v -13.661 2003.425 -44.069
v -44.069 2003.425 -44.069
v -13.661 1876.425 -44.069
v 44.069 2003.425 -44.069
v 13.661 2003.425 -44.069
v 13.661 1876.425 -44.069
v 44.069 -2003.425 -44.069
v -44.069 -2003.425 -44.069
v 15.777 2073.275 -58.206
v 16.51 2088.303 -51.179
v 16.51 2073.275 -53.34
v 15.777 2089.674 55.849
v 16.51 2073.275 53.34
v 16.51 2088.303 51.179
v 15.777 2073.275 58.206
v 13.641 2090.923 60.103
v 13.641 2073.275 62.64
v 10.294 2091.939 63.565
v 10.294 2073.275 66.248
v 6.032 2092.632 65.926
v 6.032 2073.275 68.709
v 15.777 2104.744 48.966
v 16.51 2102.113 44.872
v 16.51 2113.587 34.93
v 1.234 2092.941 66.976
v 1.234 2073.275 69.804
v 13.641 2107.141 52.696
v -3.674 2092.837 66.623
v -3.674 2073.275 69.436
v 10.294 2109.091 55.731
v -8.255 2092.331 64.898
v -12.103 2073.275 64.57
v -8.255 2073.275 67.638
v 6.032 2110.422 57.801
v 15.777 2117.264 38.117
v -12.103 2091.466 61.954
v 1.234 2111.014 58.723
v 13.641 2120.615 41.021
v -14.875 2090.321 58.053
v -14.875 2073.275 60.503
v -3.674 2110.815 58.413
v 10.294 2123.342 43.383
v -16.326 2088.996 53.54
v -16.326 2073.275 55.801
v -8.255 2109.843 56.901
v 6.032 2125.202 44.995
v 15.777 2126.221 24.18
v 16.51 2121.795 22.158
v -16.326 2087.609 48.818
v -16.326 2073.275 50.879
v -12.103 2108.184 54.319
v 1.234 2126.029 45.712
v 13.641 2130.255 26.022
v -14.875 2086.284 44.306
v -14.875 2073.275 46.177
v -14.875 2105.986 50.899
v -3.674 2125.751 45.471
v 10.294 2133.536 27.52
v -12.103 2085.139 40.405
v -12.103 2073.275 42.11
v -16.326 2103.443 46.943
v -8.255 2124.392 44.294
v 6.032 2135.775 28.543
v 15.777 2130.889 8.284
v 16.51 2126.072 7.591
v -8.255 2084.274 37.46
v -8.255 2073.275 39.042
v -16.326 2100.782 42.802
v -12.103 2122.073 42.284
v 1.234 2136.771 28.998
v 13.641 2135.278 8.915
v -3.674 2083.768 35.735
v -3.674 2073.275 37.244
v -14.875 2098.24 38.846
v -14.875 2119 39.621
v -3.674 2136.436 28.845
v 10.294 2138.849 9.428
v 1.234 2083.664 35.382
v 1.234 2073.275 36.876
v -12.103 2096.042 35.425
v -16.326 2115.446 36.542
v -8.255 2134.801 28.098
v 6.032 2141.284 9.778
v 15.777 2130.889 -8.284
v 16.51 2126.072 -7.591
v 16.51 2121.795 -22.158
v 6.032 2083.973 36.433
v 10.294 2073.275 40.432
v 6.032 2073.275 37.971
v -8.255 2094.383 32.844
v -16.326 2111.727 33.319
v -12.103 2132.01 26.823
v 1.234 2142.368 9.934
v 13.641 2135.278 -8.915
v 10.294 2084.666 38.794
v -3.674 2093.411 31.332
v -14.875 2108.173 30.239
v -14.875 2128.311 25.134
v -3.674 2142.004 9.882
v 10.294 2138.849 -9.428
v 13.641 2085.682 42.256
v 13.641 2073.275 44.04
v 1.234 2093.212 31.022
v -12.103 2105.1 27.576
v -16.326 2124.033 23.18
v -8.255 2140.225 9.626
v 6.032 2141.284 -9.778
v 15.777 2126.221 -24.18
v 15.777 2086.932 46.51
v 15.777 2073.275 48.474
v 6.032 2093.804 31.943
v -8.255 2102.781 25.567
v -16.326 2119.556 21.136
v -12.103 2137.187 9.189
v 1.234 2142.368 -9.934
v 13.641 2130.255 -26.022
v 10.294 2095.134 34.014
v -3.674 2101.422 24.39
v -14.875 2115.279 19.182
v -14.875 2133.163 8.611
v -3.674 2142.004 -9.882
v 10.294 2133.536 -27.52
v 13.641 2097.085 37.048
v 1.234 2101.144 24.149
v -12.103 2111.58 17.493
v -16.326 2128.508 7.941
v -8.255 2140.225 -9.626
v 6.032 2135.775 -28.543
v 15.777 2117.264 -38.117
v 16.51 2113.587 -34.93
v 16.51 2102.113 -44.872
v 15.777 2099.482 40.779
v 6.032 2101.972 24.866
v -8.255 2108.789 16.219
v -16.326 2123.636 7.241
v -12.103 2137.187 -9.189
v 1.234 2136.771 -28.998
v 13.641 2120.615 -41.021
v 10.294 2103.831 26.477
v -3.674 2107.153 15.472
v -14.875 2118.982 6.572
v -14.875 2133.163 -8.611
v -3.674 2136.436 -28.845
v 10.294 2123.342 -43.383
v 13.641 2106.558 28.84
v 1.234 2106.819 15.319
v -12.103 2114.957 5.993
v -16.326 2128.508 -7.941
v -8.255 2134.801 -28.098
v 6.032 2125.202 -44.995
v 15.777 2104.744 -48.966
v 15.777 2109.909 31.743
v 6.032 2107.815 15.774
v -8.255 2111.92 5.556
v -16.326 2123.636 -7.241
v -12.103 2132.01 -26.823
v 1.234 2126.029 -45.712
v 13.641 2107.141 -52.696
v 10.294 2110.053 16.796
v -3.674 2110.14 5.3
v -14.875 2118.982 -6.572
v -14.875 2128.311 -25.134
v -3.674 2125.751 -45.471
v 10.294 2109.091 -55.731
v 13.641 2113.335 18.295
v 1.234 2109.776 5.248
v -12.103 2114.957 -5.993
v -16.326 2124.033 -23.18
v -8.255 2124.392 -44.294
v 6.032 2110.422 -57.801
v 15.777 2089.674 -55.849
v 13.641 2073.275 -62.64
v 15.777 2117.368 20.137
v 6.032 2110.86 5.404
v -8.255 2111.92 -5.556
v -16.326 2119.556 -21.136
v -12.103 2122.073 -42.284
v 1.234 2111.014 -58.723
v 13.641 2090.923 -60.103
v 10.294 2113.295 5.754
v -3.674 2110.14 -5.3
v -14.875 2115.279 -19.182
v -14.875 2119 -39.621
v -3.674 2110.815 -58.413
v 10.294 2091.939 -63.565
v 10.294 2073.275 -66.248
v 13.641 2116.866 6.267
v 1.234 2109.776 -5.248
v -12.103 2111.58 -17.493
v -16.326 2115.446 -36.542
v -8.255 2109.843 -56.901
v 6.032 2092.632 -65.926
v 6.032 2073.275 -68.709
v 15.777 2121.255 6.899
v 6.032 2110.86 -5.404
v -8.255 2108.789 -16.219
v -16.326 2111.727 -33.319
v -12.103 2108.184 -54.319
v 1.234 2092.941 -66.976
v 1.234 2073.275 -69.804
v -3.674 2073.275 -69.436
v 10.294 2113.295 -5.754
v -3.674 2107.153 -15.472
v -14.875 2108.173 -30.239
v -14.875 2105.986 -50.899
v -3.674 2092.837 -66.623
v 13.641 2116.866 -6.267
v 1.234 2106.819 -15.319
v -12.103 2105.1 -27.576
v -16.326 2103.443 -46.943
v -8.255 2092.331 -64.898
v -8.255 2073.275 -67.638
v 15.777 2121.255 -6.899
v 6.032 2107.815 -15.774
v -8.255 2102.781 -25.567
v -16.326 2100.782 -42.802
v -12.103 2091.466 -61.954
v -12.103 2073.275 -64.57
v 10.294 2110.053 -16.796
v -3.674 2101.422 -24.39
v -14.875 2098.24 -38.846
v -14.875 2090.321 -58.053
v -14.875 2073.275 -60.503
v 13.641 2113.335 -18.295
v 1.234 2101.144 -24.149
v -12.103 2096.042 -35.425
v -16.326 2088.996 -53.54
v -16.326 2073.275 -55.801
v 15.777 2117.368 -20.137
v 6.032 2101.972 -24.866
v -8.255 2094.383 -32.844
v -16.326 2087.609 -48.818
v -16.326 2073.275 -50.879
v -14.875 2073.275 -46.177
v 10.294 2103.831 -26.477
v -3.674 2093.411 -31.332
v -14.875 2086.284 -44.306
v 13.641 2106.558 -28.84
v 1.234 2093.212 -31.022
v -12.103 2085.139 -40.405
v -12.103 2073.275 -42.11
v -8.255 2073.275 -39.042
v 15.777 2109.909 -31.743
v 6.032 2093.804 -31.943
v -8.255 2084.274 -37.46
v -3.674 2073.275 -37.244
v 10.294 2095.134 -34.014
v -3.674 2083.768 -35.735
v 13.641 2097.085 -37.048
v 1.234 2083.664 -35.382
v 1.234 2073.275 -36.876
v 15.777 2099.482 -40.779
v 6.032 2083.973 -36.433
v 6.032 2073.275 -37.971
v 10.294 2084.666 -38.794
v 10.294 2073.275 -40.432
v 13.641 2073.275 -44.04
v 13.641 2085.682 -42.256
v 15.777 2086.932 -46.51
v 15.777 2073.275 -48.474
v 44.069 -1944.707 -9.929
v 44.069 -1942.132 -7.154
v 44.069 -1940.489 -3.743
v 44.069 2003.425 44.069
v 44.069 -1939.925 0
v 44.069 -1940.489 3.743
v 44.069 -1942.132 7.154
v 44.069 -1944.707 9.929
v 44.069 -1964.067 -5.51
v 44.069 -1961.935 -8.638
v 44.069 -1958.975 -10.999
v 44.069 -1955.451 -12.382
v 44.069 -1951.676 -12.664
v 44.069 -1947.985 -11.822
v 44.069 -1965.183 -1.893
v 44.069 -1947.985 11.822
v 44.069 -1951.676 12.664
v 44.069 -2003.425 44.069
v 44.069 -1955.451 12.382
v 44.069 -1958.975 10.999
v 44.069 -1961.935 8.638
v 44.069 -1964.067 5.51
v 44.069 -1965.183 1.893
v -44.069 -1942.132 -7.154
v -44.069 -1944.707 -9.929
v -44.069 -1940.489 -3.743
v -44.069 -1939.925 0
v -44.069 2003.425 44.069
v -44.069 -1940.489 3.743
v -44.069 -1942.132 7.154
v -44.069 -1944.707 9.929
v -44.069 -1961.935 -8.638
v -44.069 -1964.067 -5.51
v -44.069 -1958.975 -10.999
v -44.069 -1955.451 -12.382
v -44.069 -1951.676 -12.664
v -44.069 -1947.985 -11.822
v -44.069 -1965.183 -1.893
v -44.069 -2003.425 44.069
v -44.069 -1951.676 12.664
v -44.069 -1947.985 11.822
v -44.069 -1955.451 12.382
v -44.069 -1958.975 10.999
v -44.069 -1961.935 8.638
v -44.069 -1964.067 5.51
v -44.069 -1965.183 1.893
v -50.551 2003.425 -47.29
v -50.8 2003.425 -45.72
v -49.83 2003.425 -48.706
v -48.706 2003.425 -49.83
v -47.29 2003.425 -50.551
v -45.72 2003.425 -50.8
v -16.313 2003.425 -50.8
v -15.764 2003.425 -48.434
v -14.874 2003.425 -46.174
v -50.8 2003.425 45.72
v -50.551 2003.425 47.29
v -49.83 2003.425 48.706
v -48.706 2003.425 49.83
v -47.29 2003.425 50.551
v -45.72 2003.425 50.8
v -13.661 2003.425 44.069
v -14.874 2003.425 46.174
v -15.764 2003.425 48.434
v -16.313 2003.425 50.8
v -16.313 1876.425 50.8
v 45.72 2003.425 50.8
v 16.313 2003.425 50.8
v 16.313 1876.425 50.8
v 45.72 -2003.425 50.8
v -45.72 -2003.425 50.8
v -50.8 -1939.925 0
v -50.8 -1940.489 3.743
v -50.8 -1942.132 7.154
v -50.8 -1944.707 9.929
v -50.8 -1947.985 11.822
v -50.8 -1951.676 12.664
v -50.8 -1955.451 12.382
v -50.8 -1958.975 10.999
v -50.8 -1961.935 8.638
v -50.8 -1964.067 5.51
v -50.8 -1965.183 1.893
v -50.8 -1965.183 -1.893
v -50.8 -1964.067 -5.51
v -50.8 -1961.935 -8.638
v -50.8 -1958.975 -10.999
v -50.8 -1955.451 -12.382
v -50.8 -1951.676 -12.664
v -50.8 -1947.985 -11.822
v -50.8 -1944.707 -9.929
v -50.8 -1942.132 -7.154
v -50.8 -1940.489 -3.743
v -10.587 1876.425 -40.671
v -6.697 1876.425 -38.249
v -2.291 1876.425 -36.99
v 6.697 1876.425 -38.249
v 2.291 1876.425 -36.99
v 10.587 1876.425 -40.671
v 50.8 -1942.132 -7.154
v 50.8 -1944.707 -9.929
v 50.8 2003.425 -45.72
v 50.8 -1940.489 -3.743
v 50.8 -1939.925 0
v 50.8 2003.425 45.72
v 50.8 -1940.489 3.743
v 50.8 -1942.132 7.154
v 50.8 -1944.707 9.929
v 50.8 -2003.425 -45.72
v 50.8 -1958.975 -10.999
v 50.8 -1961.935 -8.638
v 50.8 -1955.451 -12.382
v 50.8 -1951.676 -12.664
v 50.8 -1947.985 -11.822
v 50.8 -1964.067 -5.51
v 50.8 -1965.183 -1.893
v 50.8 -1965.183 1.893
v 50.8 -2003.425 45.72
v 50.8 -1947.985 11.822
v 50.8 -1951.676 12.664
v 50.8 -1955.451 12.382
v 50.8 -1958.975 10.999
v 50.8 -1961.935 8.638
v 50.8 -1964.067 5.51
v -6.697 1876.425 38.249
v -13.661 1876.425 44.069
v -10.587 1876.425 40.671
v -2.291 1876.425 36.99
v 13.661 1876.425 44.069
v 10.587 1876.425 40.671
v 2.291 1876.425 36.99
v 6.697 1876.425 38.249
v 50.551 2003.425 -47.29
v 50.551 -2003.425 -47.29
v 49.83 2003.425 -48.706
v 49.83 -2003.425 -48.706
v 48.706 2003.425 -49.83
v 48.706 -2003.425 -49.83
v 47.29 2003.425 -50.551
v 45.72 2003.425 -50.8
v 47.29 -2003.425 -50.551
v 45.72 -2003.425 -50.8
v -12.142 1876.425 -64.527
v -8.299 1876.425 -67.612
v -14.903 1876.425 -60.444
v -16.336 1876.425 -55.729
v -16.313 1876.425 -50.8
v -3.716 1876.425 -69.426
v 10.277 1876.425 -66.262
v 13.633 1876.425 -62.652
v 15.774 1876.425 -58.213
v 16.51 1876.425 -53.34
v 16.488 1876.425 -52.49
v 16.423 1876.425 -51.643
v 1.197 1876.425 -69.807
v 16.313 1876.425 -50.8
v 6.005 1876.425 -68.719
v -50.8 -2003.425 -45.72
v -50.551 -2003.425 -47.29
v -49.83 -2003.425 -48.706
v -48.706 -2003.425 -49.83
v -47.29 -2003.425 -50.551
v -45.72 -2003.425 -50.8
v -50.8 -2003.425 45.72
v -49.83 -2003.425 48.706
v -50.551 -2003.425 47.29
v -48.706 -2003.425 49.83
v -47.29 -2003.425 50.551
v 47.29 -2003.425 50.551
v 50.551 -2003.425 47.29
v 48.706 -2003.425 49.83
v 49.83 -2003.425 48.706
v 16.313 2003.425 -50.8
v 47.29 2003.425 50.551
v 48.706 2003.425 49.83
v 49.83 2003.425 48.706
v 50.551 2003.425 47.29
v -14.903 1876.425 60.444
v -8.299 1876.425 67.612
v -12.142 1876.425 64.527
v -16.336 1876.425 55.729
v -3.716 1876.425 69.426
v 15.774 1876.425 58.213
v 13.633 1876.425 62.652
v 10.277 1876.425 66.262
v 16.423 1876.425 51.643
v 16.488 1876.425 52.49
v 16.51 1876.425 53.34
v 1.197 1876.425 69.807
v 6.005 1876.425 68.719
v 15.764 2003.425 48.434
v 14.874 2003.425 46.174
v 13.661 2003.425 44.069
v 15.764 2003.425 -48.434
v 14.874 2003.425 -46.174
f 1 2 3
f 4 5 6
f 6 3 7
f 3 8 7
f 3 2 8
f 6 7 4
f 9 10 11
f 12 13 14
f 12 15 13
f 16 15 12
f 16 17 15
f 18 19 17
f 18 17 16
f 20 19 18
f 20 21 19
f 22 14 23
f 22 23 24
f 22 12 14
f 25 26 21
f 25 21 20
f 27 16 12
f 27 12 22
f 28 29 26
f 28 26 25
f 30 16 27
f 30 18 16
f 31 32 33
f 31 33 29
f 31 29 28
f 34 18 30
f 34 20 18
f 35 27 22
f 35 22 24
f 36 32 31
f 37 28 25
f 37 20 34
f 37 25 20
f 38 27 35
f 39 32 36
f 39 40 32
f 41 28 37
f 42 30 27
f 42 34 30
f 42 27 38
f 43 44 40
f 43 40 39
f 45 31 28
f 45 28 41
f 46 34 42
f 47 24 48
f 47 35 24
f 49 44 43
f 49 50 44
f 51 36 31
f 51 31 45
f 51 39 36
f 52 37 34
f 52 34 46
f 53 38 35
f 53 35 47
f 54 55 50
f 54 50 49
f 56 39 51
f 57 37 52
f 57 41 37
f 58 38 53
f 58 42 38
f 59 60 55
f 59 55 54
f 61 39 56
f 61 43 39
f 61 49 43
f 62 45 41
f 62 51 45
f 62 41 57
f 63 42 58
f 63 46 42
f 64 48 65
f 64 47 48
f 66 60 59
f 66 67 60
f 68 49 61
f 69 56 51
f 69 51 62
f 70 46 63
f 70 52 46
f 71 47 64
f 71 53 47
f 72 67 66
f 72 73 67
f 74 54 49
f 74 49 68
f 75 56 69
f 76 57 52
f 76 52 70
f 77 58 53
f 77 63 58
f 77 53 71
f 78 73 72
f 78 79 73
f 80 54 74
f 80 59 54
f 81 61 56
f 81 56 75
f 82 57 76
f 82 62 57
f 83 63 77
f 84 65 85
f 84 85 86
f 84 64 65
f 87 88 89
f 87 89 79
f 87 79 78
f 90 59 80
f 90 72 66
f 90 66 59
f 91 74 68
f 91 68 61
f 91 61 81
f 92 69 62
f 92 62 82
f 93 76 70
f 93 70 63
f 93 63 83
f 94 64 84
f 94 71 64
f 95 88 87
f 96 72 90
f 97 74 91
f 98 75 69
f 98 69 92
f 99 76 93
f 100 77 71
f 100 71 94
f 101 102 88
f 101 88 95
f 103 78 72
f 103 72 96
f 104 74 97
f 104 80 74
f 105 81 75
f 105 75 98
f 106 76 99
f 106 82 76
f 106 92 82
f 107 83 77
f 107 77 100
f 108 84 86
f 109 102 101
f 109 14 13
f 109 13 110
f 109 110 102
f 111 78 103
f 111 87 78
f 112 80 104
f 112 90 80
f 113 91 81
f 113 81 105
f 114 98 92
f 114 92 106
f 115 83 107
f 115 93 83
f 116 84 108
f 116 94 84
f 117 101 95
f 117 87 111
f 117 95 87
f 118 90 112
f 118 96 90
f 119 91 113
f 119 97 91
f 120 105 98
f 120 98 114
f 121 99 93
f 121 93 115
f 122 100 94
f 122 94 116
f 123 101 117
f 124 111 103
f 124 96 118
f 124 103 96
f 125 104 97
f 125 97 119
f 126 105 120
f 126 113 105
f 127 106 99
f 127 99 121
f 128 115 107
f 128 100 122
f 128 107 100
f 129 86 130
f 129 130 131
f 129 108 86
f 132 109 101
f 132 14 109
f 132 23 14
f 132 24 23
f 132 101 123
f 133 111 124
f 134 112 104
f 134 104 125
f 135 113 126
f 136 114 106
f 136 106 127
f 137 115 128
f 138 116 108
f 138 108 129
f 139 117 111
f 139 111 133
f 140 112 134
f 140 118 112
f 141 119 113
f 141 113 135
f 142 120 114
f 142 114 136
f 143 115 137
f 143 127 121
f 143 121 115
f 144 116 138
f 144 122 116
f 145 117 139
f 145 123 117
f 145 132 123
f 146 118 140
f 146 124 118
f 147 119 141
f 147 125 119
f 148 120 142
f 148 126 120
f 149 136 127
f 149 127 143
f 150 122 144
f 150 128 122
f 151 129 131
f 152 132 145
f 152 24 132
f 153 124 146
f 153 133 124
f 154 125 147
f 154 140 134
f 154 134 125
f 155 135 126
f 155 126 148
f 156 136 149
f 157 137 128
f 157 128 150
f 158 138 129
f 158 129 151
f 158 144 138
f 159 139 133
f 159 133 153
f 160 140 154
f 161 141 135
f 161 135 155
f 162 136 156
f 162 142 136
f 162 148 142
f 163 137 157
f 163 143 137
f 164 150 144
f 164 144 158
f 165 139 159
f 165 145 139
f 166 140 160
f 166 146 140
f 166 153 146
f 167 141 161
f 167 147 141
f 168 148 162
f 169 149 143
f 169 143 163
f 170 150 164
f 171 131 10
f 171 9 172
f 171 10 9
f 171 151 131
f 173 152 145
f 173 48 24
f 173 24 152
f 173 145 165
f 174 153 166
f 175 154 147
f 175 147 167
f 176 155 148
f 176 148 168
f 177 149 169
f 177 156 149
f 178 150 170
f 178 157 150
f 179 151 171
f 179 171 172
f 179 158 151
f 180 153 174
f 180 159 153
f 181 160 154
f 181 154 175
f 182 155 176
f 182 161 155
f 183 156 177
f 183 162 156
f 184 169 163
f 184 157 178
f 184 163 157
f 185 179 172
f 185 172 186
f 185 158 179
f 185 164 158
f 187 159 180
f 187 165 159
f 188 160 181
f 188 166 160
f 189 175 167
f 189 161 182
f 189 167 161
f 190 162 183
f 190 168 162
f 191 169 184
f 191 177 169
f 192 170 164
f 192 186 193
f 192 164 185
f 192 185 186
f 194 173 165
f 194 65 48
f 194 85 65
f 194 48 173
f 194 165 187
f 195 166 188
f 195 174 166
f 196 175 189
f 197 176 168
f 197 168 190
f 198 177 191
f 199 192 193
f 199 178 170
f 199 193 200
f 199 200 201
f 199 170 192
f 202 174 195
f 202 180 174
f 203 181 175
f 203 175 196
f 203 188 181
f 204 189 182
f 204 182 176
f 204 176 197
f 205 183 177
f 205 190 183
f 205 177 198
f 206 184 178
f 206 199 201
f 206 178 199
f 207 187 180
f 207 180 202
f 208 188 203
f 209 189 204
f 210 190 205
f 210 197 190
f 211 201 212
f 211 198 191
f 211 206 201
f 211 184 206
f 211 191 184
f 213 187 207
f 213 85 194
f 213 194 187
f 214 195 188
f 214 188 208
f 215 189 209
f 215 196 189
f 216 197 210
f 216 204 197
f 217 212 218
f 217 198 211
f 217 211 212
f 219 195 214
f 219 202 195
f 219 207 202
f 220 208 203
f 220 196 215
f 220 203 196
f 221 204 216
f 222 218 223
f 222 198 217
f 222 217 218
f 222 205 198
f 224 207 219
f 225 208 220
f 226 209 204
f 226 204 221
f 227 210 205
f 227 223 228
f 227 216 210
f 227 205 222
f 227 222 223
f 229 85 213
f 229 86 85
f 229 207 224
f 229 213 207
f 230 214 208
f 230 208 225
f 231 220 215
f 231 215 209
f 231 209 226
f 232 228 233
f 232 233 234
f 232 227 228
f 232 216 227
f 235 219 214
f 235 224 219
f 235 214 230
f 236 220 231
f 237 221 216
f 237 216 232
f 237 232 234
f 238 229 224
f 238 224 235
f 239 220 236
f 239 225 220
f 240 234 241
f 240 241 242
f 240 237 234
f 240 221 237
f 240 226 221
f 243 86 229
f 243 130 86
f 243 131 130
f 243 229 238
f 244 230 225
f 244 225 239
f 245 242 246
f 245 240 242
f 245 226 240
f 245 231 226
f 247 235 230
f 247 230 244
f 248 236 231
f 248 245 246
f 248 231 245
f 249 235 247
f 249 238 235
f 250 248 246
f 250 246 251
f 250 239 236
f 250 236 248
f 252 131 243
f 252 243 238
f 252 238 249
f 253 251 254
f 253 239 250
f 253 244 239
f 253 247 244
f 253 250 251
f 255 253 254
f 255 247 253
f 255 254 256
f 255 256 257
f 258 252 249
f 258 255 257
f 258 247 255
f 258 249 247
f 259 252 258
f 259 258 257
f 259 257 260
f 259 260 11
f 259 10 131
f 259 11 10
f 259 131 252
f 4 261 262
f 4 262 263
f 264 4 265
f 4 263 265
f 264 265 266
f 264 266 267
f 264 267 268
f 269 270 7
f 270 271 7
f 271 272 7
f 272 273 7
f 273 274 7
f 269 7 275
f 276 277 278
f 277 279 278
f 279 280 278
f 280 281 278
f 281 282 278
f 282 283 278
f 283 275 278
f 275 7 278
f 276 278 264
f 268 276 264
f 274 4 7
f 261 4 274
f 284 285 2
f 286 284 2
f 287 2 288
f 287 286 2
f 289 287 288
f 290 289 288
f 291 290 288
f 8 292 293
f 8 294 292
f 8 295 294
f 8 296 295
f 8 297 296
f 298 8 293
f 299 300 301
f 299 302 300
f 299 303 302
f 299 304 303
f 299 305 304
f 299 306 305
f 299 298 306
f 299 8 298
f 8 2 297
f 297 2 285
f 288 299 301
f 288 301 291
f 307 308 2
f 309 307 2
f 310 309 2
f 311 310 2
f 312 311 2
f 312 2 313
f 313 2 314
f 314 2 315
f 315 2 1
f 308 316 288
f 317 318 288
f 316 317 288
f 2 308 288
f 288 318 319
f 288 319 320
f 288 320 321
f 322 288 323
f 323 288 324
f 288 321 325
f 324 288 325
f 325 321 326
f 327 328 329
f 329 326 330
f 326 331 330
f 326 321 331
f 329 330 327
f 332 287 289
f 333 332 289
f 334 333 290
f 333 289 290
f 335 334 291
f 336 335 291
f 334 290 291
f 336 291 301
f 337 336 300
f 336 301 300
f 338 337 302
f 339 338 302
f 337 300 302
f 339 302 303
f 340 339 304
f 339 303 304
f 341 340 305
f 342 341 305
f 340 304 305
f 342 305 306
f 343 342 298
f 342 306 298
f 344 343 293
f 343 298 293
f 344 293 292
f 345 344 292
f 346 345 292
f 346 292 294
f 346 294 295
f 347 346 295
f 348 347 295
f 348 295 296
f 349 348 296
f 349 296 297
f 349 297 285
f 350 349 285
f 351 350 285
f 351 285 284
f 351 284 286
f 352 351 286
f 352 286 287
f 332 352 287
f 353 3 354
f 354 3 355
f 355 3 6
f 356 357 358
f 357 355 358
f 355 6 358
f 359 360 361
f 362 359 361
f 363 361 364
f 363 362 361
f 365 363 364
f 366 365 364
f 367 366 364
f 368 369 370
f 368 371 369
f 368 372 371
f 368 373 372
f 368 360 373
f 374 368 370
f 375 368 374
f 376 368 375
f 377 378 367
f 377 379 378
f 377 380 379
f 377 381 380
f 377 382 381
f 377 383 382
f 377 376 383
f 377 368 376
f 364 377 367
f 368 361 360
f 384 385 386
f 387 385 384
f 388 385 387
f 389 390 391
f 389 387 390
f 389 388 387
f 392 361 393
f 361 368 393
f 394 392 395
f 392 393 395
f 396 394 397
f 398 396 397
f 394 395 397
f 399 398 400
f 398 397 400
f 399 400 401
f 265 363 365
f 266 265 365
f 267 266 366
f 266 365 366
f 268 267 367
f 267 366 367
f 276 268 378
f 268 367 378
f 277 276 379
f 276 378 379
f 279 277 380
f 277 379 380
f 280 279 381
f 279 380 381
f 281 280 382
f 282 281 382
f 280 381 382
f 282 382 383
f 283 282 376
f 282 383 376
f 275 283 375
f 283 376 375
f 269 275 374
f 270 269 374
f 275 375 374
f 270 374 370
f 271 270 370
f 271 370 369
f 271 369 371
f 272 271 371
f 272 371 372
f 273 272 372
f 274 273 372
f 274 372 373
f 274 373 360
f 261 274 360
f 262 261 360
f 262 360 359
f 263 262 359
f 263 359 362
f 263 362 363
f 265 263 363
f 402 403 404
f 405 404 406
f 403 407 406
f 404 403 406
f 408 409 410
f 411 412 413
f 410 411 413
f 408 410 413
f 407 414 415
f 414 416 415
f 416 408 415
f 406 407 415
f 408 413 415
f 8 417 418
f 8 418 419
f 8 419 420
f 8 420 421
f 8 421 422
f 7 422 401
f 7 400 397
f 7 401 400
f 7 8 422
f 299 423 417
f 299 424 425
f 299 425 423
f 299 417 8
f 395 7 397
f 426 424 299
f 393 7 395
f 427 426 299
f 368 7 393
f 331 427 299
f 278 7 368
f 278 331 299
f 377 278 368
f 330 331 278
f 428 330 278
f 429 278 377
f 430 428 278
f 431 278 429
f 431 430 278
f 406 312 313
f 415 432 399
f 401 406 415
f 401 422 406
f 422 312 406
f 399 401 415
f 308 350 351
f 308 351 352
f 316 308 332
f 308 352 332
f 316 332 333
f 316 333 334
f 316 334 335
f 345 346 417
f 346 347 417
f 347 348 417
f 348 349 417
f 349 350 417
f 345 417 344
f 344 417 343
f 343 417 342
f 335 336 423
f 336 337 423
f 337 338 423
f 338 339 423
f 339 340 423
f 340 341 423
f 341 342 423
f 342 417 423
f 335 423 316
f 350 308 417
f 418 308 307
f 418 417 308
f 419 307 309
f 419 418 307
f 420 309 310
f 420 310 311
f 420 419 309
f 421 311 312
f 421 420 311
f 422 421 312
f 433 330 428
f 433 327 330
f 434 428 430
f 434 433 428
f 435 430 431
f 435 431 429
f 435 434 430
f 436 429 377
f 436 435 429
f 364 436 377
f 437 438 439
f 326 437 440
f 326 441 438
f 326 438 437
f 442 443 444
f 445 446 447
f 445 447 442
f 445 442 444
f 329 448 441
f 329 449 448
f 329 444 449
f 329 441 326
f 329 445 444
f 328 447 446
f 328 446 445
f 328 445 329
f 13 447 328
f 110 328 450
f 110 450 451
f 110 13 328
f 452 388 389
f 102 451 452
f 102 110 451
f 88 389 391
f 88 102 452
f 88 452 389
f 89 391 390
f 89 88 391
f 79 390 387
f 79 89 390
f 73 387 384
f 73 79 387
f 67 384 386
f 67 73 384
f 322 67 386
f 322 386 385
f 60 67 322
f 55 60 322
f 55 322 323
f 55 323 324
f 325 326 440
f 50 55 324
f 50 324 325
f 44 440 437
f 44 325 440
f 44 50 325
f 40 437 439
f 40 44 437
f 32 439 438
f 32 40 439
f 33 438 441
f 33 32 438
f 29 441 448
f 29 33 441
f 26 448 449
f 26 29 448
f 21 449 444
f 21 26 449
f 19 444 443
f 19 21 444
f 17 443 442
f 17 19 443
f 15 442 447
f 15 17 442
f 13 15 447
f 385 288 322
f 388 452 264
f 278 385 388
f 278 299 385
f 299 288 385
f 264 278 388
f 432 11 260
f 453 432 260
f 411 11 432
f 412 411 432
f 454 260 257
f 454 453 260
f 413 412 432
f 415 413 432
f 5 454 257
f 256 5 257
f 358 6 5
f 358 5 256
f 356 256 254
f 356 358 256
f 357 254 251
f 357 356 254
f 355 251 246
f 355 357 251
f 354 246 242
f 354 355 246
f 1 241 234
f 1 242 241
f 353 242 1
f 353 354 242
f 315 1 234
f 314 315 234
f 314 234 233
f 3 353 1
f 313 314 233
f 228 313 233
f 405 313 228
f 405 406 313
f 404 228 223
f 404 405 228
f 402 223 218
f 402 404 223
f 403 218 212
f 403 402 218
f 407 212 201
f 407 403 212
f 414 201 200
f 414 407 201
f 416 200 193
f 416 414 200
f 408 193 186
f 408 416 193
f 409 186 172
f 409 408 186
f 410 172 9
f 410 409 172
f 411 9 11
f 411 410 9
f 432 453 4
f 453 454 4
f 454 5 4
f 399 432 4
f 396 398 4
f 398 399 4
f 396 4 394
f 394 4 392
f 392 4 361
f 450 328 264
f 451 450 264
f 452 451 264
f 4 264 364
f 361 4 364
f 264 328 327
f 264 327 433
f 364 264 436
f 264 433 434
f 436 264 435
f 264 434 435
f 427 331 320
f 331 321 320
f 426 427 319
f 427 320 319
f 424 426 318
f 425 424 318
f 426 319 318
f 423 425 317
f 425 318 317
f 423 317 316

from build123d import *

# Parameters (mm, degrees)
F0_W     = 101.6
F0_H     = 101.6
F0_W_2   = 88.138
F0_H_2   = 88.138
F1_DEPTH = 2003.425
F2_R     = 12.7
F3_DEPTH = 101.601
F6_R     = 16.51
F8_R     = 5.08


with BuildPart() as f1:
    # F0 (on Front) → F1 (new body, symmetric)
    with BuildSketch(Plane.XZ):
        Rectangle(F0_W, F0_H)
        Rectangle(F0_W_2, F0_H_2, mode=Mode.SUBTRACT)
    extrude(amount=F1_DEPTH, both=True)

    # F2 (on face) → F3 (cut, through all)
    with BuildSketch(Plane.YZ.offset(50.8)):
        with Locations((-1952.625, 0)):
            Circle(F2_R)
    extrude(amount=-F3_DEPTH, mode=Mode.SUBTRACT)

    # F7: sweep along a path in F4
    with BuildLine(Plane.YZ) as f7_path:
        Line((1876.425, 53.34), (2073.275, 53.34))
        ThreePointArc((2073.275, 53.34), (2126.615, 0), (2073.275, -53.34))
        Line((2073.275, -53.34), (1876.425, -53.34))
    # F6 (on plane+point) → F7 (sweep)
    with BuildSketch(Plane.XZ.offset(-1876.425)):
        with Locations((0, 53.34)):
            Circle(F6_R)
    sweep(path=f7_path.line)

    # F8
    f8_edges = [f1.edges().sort_by_distance(p)[0] for p in [
        (50.8, 0, 50.8),
        (-50.8, 0, 50.8),
        (50.8, 0, -50.8),
        (-50.8, 0, -50.8),
    ]]
    fillet(f8_edges, radius=F8_R)


solid = f1.part
